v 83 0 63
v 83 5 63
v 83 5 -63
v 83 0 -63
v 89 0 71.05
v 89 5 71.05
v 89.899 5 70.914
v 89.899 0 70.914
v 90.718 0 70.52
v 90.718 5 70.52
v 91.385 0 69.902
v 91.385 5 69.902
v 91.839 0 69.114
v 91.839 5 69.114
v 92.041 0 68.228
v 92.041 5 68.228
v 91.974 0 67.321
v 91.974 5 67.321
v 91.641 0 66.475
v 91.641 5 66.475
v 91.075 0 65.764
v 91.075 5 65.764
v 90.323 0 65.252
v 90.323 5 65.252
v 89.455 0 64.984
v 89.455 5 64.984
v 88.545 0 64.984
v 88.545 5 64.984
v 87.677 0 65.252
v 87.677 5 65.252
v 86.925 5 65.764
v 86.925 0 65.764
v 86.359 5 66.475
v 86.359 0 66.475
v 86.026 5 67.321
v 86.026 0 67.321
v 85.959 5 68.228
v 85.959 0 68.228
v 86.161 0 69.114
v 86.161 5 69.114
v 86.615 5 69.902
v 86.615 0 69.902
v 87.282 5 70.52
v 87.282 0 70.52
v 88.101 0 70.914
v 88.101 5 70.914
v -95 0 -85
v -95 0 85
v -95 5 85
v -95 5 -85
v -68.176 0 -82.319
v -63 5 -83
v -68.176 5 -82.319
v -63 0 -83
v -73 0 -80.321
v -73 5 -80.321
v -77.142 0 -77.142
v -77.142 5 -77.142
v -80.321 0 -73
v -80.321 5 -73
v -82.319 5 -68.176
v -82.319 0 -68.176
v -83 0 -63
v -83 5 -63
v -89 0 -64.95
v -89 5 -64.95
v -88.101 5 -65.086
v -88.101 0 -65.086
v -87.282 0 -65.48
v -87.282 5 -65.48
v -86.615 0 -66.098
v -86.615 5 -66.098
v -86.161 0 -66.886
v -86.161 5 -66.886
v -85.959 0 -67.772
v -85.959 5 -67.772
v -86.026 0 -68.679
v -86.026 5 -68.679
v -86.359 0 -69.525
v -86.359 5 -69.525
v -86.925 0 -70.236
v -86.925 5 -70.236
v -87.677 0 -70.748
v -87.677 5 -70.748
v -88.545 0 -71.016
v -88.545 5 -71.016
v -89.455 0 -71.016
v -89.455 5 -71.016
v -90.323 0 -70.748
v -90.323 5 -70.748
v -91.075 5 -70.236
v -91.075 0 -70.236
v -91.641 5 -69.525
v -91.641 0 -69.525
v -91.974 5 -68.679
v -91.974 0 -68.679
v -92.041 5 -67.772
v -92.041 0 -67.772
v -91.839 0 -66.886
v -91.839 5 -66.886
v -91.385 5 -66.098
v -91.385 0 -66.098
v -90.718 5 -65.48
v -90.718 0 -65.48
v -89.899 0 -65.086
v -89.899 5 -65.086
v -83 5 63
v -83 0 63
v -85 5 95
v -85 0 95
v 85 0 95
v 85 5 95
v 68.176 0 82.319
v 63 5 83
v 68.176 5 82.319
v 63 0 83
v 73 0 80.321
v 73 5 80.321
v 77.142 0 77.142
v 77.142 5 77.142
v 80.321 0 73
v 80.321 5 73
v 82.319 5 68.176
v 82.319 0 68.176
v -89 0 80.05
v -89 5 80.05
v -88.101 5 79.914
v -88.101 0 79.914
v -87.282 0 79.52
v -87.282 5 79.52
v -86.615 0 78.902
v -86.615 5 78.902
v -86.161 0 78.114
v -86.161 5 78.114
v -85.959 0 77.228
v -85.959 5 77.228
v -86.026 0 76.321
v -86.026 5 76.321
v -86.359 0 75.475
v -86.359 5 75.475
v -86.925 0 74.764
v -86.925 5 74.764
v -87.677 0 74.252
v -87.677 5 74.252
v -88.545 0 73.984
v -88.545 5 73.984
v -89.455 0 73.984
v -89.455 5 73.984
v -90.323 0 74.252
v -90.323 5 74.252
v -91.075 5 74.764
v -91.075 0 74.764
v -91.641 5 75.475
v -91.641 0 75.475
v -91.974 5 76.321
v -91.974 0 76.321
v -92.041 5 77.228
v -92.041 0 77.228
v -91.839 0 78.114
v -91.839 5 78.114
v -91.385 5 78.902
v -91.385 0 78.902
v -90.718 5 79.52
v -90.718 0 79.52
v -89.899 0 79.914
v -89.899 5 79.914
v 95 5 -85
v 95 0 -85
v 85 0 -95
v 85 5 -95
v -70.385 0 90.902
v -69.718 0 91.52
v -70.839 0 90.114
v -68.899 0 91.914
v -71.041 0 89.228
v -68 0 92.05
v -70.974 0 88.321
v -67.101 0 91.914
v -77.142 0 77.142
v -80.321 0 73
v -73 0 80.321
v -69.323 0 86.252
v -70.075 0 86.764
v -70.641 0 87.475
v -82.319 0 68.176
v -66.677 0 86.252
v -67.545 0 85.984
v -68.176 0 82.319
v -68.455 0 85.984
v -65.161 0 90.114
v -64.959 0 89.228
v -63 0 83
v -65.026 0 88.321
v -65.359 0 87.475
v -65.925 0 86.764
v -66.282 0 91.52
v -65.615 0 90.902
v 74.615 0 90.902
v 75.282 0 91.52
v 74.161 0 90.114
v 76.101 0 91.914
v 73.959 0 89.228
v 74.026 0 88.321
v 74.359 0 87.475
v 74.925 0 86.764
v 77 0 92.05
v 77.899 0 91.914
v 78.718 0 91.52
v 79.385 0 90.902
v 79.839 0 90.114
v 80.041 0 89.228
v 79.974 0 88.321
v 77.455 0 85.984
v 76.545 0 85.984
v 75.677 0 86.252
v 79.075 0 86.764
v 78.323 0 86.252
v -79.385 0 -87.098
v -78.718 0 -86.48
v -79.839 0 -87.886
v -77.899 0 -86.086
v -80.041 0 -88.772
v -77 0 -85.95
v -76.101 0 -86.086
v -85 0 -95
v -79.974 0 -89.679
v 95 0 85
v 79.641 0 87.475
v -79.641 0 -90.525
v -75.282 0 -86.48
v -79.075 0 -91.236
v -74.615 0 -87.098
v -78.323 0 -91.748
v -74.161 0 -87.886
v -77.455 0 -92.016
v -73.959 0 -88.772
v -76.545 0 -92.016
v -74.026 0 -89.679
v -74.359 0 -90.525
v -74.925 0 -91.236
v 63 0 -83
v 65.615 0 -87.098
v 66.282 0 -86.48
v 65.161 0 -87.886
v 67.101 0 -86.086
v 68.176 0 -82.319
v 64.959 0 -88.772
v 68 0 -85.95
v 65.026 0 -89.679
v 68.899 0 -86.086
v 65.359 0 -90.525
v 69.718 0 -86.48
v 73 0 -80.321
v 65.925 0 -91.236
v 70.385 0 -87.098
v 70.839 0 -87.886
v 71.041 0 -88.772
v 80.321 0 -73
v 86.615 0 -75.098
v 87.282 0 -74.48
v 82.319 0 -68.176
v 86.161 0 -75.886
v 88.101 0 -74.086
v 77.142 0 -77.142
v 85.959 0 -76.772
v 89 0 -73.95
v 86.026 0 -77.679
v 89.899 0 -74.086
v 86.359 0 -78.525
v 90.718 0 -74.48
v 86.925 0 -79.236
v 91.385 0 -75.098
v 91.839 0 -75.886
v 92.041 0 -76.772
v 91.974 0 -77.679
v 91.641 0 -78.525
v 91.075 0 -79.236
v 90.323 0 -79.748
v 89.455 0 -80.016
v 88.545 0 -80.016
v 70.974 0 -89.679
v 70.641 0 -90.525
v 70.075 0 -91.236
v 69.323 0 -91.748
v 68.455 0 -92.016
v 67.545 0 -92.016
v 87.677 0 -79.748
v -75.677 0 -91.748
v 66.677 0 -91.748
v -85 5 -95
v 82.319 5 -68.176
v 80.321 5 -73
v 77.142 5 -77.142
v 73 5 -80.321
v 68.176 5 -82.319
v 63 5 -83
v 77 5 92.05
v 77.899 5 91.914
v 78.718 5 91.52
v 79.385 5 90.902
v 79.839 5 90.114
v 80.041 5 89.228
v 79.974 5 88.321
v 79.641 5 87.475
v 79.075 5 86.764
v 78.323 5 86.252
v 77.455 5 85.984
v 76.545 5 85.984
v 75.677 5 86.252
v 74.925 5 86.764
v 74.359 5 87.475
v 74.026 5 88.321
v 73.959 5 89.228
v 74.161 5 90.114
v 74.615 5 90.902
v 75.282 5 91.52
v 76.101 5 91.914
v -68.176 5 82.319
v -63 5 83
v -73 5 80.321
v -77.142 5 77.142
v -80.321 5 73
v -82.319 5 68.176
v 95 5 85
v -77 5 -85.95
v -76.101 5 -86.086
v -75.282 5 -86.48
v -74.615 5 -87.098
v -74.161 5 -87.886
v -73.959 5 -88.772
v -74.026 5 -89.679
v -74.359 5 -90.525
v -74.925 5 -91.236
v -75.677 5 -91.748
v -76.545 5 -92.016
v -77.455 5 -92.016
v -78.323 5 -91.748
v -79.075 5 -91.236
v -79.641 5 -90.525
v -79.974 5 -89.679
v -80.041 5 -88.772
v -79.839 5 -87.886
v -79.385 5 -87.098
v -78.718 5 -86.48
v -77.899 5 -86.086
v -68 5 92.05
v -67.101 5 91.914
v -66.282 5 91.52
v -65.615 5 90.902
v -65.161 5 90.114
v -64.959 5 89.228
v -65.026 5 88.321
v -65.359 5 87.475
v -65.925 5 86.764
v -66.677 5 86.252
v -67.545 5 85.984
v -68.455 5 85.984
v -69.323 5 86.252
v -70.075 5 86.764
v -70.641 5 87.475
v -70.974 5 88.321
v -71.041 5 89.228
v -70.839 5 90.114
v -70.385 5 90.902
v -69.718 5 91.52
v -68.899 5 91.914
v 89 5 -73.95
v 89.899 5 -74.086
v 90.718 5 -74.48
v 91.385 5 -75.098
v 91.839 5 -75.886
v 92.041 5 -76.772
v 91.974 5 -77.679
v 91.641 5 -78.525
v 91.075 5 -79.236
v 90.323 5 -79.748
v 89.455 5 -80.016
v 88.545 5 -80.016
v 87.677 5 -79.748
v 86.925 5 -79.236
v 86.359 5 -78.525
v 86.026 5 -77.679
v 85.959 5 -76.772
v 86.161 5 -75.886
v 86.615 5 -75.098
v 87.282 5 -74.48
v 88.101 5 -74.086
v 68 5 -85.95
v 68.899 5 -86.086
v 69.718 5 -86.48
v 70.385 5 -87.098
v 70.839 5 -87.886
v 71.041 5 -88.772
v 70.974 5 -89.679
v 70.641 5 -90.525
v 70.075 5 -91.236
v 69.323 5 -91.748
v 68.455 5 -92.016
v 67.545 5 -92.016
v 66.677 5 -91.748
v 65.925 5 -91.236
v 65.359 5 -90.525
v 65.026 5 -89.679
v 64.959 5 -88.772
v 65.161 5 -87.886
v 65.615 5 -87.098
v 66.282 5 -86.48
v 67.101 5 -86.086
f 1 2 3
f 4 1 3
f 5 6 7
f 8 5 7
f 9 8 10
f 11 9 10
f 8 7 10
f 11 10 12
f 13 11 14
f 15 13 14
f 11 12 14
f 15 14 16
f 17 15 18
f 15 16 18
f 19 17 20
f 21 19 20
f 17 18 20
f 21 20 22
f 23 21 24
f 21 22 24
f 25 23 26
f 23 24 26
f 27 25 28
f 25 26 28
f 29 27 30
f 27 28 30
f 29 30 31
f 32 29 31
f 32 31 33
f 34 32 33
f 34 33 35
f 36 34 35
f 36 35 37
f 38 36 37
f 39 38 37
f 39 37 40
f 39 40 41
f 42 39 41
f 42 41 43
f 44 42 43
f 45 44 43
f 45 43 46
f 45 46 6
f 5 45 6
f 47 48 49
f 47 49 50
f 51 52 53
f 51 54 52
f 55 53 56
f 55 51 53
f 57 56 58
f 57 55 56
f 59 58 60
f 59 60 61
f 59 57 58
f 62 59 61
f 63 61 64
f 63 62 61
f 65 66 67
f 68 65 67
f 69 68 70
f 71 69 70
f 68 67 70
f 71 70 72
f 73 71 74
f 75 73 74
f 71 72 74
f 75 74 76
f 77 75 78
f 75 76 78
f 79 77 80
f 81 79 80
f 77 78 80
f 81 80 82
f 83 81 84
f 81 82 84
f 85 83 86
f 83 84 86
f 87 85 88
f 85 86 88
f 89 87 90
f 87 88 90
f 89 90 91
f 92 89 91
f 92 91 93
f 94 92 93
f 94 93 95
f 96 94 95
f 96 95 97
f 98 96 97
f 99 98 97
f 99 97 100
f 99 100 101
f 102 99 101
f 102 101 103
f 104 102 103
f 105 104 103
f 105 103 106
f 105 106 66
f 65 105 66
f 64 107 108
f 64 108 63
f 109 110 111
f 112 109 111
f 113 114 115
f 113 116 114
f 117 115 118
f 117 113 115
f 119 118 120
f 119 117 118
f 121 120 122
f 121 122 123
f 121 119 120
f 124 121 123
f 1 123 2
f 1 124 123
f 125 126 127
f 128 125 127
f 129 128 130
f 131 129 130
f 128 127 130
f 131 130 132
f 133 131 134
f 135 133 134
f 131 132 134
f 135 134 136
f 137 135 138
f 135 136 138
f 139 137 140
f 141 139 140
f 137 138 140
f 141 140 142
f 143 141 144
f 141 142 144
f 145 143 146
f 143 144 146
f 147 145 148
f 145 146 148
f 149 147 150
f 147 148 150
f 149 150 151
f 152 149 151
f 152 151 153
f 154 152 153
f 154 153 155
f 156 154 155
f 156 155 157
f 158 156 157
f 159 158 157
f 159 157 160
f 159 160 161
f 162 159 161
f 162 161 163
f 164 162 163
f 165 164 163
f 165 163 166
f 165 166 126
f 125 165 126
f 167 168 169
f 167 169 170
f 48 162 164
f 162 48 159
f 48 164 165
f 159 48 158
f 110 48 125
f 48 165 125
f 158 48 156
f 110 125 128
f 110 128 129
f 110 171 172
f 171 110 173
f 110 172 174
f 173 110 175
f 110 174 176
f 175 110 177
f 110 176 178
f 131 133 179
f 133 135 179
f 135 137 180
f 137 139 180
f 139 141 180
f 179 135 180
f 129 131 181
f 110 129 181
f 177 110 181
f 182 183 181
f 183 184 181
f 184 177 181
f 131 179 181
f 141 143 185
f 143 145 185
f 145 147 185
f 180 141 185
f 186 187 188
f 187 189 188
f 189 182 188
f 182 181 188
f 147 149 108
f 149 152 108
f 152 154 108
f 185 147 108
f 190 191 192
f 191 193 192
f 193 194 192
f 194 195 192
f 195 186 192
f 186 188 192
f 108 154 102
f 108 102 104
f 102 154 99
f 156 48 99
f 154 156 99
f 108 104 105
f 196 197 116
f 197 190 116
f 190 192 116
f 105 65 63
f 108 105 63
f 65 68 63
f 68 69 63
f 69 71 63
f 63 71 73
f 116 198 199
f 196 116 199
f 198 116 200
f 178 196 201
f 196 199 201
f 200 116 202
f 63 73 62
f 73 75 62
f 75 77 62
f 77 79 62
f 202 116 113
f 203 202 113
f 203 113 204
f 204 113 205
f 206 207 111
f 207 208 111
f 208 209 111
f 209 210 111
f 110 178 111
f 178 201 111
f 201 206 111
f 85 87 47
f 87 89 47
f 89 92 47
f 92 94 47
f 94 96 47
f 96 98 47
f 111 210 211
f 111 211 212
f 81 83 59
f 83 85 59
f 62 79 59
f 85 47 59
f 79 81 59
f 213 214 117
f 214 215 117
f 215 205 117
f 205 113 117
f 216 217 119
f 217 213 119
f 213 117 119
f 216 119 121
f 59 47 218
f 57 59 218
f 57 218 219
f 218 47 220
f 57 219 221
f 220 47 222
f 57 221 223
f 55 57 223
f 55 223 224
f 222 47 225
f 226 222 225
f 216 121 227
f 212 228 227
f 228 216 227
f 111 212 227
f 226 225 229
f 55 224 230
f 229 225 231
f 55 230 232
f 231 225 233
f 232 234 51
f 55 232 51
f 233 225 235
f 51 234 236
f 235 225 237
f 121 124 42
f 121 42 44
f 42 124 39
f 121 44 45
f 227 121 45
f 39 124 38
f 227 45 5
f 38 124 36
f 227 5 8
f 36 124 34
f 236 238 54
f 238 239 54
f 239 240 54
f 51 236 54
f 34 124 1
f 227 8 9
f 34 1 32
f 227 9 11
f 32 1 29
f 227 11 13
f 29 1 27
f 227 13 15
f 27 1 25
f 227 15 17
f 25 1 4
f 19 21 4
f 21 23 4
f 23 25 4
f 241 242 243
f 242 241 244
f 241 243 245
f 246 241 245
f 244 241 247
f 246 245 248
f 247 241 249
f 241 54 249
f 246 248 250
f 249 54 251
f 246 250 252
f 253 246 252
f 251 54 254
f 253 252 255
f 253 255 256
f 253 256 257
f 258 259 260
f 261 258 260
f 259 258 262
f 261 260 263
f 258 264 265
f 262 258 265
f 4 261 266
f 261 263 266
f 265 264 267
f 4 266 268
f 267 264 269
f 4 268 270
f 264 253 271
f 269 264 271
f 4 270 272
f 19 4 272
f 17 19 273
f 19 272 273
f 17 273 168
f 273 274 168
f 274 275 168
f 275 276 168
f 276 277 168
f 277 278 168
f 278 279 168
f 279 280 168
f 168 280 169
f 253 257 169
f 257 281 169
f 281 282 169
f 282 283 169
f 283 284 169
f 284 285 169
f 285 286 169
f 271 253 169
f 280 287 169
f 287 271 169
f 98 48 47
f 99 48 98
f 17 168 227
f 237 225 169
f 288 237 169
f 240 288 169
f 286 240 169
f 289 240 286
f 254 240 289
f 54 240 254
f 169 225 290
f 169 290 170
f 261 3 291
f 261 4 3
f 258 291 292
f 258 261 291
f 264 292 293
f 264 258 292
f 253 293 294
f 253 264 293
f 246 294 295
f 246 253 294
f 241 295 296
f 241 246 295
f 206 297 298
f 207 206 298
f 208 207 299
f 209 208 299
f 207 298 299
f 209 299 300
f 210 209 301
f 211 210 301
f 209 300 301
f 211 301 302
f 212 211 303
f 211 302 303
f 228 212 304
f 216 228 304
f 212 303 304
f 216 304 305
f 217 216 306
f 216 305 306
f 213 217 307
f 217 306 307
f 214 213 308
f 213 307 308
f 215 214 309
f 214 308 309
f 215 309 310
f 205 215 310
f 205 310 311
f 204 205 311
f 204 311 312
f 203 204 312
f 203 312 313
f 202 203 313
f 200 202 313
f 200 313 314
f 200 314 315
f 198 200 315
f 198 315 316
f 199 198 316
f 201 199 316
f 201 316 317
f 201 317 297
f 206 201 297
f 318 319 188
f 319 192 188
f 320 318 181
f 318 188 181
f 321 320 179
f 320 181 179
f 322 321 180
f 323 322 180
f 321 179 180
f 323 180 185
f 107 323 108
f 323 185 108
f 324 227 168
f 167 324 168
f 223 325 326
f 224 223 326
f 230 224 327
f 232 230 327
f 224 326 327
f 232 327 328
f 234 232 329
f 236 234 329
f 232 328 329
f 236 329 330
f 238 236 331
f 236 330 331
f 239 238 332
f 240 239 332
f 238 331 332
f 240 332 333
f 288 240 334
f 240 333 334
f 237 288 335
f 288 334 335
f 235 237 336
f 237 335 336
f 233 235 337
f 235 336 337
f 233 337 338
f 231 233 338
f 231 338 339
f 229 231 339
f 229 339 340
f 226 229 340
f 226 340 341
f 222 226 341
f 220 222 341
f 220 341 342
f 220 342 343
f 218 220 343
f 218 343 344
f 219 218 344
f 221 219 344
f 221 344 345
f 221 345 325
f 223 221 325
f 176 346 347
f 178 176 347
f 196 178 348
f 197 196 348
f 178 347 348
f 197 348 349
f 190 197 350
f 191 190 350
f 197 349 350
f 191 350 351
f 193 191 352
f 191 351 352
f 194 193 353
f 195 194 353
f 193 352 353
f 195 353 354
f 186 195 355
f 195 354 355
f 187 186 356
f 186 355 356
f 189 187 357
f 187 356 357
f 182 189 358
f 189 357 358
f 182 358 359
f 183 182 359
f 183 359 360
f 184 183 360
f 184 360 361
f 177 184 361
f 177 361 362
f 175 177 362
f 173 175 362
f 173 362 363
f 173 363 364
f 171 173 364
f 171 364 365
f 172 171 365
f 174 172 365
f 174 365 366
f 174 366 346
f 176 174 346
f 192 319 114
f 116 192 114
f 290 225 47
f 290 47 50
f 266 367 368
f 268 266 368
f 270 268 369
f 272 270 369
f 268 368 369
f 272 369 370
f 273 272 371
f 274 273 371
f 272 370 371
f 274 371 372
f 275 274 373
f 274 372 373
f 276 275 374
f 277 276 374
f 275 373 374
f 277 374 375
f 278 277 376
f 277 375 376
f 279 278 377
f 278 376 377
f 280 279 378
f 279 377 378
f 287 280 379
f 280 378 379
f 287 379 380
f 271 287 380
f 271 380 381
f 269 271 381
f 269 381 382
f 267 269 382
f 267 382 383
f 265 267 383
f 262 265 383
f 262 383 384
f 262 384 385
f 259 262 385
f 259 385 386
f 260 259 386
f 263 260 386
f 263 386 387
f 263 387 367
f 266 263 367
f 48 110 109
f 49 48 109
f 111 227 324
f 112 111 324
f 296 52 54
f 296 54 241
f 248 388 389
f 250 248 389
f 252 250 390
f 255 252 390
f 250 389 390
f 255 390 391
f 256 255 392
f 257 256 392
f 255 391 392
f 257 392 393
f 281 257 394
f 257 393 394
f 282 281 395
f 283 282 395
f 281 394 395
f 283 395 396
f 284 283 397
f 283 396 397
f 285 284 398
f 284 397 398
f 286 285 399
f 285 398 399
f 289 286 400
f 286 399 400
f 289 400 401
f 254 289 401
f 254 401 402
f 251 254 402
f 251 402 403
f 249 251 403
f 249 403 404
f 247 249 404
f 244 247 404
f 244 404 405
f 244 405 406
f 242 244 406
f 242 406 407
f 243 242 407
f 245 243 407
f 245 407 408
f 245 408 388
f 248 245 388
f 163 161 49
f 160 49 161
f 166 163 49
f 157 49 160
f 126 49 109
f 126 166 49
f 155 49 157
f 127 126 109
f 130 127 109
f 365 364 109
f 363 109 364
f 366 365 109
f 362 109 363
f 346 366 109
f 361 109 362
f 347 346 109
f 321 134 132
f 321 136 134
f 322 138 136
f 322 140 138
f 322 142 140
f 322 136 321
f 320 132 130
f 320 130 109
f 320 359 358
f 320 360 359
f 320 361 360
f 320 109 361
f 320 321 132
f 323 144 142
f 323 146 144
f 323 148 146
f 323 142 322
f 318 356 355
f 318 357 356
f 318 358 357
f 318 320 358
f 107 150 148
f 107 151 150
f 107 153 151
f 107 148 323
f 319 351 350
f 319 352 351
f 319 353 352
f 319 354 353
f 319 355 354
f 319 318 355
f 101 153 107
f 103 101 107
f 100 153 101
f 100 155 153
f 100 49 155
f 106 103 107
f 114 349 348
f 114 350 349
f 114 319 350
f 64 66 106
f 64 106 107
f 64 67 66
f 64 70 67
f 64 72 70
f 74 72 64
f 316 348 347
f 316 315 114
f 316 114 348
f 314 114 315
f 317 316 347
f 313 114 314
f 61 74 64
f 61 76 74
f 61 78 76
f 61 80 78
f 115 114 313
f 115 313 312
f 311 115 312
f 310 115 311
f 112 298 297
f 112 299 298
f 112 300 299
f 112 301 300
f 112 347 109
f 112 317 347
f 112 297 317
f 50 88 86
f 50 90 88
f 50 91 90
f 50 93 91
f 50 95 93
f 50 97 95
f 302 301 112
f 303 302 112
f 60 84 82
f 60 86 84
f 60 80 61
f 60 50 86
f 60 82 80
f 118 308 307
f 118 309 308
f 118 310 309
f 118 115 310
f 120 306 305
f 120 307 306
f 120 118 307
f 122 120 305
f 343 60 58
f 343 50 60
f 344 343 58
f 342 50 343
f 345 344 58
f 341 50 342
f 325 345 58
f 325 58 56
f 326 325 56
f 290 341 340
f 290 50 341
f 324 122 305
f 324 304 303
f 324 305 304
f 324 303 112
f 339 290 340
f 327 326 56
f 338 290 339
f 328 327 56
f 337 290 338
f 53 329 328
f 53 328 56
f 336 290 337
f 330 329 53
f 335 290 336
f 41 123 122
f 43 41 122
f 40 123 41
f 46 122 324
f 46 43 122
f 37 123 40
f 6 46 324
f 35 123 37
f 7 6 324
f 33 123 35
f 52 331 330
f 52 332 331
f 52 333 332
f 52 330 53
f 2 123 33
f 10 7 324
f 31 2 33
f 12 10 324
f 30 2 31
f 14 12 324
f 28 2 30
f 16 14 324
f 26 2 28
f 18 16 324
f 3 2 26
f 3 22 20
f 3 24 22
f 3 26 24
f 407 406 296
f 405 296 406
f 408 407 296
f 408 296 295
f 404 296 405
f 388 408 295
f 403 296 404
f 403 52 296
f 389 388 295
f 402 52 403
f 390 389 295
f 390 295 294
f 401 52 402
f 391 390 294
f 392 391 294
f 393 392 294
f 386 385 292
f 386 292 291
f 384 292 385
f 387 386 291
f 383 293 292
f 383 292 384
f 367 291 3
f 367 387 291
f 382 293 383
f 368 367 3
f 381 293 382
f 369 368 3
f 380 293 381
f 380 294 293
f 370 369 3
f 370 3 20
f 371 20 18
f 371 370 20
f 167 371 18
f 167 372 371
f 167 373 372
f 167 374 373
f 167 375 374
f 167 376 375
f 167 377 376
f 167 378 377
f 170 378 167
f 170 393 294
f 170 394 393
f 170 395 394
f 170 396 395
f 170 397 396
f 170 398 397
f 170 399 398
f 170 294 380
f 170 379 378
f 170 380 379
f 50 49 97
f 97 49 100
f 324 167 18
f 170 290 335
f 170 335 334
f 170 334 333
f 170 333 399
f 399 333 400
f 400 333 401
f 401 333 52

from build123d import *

# Parameters (mm, degrees)
SKETCH1_W           = 190
SKETCH1_H           = 190
BOSS_EXTRUDE1_DEPTH = 5
SKETCH2_W           = 166
SKETCH2_H           = 166
CUT_EXTRUDE1_DEPTH  = 135.443296597
FILLET1_R           = 20
SKETCH3_R           = 3.05
CUT_EXTRUDE2_DEPTH  = 135.443296597
CHAMFER1_SIZE       = 10


with BuildPart() as part:
    # Sketch1 → Boss-Extrude1 (new body)
    with BuildSketch(Plane(origin=(0, 0, 0), x_dir=(1, 0, 0), z_dir=(0, 1, 0))):
        Rectangle(SKETCH1_W, SKETCH1_H)
    extrude(amount=BOSS_EXTRUDE1_DEPTH)

    # Sketch2 → Cut-Extrude1 (cut, through all)
    with BuildSketch(Plane(origin=(0, 5, 0), x_dir=(1, 0, 0), z_dir=(0, 1, 0))):
        Rectangle(SKETCH2_W, SKETCH2_H)
    extrude(amount=-CUT_EXTRUDE1_DEPTH, mode=Mode.SUBTRACT)

    # Fillet1
    fillet1_edges = [part.edges().sort_by_distance(p)[0] for p in [
        (83, 2.5, -83),
        (83, 2.5, 83),
        (-83, 2.5, 83),
        (-83, 2.5, -83),
    ]]
    fillet(fillet1_edges, radius=FILLET1_R)

    # Sketch3 → Cut-Extrude2 (cut, through all)
    with BuildSketch(Plane(origin=(0, 5, 0), x_dir=(1, 0, 0), z_dir=(0, 1, 0))):
        with Locations(Location((-77, 89, 0), (0, 0, 270))):
            Circle(SKETCH3_R)
        with Locations(Location((-89, 68, 0), (0, 0, 270))):
            Circle(SKETCH3_R)
        with Locations(Location((89, 77, 0), (0, 0, 270))):
            Circle(SKETCH3_R)
        with Locations(Location((68, 89, 0), (0, 0, 270))):
            Circle(SKETCH3_R)
        with Locations(Location((77, -89, 0), (0, 0, 270))):
            Circle(SKETCH3_R)
        with Locations(Location((89, -68, 0), (0, 0, 270))):
            Circle(SKETCH3_R)
        with Locations(Location((-89, -77, 0), (0, 0, 270))):
            Circle(SKETCH3_R)
        with Locations(Location((-68, -89, 0), (0, 0, 270))):
            Circle(SKETCH3_R)
    extrude(amount=-CUT_EXTRUDE2_DEPTH, mode=Mode.SUBTRACT)

    # Chamfer1
    chamfer1_edges = [part.edges().sort_by_distance(p)[0] for p in [
        (-95, 2.5, -95),
        (-95, 2.5, 95),
        (95, 2.5, 95),
        (95, 2.5, -95),
    ]]
    chamfer(chamfer1_edges, length=CHAMFER1_SIZE)


solid = part.part
